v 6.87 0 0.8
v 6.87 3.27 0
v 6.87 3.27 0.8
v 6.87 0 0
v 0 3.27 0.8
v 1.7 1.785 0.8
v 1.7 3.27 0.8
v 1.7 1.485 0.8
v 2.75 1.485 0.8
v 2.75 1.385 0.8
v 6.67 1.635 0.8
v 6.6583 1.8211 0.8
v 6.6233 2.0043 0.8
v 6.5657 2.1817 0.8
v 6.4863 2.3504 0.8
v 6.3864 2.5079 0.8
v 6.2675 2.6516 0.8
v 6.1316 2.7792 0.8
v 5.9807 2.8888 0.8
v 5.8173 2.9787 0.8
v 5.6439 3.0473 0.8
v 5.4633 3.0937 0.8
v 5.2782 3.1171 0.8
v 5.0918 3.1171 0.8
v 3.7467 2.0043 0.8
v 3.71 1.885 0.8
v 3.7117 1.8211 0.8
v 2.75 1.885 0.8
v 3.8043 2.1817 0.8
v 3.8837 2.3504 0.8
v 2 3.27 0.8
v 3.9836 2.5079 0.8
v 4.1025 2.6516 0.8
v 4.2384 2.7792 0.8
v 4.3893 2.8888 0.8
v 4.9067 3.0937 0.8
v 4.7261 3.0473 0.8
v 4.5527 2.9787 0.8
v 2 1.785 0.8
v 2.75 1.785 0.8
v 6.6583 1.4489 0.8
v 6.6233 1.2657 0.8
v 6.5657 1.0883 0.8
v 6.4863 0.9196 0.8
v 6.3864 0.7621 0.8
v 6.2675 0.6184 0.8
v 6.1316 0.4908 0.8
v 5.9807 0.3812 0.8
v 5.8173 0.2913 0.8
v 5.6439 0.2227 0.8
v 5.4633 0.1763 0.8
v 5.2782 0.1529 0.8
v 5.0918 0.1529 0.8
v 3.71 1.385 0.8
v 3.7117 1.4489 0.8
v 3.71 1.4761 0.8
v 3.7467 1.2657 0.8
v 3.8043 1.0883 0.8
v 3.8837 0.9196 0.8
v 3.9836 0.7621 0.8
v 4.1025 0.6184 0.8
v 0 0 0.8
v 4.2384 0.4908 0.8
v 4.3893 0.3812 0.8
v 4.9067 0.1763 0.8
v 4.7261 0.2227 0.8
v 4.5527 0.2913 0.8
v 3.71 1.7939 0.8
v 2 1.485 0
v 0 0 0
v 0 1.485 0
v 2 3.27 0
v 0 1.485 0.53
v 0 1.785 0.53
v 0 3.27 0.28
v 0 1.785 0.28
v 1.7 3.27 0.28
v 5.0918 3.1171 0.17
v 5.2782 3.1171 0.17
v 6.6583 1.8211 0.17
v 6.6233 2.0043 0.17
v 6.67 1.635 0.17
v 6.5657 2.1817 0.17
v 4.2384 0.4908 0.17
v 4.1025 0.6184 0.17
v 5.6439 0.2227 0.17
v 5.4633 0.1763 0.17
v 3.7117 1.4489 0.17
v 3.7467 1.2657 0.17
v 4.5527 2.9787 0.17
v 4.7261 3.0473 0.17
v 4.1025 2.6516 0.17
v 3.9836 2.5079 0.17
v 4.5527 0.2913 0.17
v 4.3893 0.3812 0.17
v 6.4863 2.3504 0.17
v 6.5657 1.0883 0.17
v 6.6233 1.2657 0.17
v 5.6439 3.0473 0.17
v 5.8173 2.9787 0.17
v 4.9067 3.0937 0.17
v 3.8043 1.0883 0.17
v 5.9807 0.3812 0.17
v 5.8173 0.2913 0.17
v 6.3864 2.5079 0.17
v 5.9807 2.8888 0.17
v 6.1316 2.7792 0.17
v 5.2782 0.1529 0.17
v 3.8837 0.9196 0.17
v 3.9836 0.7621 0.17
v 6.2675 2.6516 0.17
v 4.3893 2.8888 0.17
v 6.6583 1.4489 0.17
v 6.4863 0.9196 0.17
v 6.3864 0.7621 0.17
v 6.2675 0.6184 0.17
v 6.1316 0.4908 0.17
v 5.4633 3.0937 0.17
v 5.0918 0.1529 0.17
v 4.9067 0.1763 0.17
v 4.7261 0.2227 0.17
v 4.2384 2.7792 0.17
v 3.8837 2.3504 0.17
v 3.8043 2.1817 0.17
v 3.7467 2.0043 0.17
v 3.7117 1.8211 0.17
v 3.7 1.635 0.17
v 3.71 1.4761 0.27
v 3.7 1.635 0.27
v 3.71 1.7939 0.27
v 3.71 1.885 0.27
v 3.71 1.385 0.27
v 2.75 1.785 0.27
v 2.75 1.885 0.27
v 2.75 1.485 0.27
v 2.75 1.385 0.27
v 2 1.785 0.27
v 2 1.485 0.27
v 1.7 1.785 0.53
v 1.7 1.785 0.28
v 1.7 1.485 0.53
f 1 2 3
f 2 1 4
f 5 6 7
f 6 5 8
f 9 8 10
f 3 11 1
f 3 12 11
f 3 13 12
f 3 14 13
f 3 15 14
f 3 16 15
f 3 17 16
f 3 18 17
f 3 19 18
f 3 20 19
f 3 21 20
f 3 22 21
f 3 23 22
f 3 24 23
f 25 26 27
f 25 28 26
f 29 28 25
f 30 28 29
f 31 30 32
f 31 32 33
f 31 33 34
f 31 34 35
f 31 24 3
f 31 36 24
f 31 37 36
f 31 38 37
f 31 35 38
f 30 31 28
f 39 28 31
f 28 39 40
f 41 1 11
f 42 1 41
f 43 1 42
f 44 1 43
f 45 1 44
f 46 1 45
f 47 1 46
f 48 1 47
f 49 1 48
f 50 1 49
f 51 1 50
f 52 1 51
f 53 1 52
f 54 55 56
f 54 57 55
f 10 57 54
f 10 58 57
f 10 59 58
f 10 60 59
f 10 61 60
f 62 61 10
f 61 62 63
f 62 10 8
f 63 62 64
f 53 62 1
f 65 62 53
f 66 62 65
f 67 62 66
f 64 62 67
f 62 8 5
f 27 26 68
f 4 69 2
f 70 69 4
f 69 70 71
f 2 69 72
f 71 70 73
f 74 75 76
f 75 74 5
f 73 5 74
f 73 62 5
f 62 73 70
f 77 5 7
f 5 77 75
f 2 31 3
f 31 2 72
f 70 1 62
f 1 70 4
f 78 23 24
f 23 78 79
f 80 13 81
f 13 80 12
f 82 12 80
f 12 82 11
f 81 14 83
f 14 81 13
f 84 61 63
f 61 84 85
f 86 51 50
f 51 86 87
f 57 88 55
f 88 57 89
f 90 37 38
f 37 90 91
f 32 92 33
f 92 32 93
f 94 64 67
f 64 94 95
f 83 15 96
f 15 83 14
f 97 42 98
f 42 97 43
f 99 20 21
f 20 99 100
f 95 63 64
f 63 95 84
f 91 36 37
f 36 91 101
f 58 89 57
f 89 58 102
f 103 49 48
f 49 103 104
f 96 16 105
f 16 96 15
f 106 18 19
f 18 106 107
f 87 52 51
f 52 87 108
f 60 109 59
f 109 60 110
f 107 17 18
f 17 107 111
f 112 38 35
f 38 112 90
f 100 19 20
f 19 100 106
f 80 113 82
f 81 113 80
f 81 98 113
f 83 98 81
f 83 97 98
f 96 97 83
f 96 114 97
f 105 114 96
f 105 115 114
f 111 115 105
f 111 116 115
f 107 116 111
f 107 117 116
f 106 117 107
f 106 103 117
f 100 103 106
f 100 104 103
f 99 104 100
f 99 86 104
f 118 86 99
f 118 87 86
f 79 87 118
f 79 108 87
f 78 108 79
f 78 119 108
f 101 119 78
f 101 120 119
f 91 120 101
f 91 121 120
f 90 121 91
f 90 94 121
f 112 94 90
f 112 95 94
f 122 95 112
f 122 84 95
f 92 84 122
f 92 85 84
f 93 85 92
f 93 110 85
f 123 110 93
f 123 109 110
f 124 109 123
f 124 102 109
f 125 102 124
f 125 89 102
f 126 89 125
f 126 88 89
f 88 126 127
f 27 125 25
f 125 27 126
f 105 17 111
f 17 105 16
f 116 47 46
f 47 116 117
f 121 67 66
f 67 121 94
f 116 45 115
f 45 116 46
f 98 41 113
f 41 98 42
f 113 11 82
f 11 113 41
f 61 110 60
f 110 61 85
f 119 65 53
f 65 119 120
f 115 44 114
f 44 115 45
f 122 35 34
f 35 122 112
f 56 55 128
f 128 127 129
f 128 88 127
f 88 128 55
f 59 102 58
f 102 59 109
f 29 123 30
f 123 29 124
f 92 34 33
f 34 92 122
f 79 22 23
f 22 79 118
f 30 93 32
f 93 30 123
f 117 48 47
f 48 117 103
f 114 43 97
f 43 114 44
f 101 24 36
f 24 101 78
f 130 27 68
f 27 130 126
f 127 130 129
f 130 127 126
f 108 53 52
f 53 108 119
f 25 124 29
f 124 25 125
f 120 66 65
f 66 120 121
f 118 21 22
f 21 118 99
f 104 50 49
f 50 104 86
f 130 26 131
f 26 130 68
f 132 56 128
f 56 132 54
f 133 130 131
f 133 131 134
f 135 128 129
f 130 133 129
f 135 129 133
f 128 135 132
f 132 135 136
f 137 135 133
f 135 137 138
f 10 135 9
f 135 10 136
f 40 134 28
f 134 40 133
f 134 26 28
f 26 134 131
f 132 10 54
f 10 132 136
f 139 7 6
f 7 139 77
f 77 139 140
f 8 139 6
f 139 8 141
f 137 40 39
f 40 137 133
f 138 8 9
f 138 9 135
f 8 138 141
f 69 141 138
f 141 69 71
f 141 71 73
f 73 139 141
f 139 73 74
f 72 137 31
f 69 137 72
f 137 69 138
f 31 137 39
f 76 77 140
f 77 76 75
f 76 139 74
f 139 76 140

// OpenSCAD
$fn = 50;
// the width to raise hollow forms over the surface to avoid one layer
delta = 0.01;

// the width of the material at the side of the circle that surrounds the holder
edge = 0.2;

// charger dimensions, given, has to measure in cm
diagonalCharger = 2.87;
radiusCharger = diagonalCharger / 2.0;
heightCharger = 0.65;
trenchWidth = 0.3;
cableThickness = 0.28;
cableNeckDiameter = 0.4;
cableNeckLength = 0.95;

// cylinder in the holder
gap = 0.05; // gap around the charger cylinder
heightCylinder = heightCharger - delta;
radiusCylinder = radiusCharger + gap;

// holder height
holderHeight = 0.8;

// trench dimensions
trenchDepth = (holderHeight + cableThickness) / 2;
trenchLength = 2.0;
trenchOverlap = trenchWidth;


// holder dimensions
holderWidth = radiusCharger * 2 + 2 * edge;
holderLength = trenchLength * 2 - trenchOverlap + 2 * radiusCylinder + edge;

difference() {
    // the whole holder
    cube([holderLength, holderWidth, holderHeight]);
    // the cylinder the charger head gets into
    translate([trenchLength * 2 - trenchOverlap + radiusCylinder,
            holderWidth / 2,
                holderHeight - heightCylinder + delta])
        cylinder(heightCylinder, radiusCylinder, radiusCylinder);

    // the trench from the charger head to leav space for the neck
    translate([2 * trenchLength - trenchOverlap - cableNeckLength, (holderWidth - cableNeckDiameter - 2 * gap) / 2,
                holderHeight - trenchDepth + delta])
        cube([cableNeckLength + delta, cableNeckDiameter + gap * 2, trenchDepth]);

    // the trench from the charger head to the wiring middle
    translate([trenchLength - trenchOverlap, (holderWidth - trenchWidth) / 2, holderHeight - trenchDepth + delta])
        cube([trenchLength + delta, trenchWidth, trenchDepth]);

    // big cut off
    translate([- delta, (holderWidth - trenchWidth) / 2, - delta])
        cube([trenchLength + delta, trenchWidth / 2 + holderWidth / 2 + delta, trenchDepth]);

    translate([trenchLength - trenchWidth, (holderWidth - trenchWidth) / 2, - delta])
        cube([trenchWidth, holderWidth / 2 + trenchWidth / 2 + delta, holderHeight + 2 * delta]);
}
translate([0, holderWidth / 2 + trenchWidth / 2, cableThickness])
    cube([trenchLength - trenchOverlap, holderWidth / 2 - trenchWidth / 2, holderHeight - cableThickness]);
